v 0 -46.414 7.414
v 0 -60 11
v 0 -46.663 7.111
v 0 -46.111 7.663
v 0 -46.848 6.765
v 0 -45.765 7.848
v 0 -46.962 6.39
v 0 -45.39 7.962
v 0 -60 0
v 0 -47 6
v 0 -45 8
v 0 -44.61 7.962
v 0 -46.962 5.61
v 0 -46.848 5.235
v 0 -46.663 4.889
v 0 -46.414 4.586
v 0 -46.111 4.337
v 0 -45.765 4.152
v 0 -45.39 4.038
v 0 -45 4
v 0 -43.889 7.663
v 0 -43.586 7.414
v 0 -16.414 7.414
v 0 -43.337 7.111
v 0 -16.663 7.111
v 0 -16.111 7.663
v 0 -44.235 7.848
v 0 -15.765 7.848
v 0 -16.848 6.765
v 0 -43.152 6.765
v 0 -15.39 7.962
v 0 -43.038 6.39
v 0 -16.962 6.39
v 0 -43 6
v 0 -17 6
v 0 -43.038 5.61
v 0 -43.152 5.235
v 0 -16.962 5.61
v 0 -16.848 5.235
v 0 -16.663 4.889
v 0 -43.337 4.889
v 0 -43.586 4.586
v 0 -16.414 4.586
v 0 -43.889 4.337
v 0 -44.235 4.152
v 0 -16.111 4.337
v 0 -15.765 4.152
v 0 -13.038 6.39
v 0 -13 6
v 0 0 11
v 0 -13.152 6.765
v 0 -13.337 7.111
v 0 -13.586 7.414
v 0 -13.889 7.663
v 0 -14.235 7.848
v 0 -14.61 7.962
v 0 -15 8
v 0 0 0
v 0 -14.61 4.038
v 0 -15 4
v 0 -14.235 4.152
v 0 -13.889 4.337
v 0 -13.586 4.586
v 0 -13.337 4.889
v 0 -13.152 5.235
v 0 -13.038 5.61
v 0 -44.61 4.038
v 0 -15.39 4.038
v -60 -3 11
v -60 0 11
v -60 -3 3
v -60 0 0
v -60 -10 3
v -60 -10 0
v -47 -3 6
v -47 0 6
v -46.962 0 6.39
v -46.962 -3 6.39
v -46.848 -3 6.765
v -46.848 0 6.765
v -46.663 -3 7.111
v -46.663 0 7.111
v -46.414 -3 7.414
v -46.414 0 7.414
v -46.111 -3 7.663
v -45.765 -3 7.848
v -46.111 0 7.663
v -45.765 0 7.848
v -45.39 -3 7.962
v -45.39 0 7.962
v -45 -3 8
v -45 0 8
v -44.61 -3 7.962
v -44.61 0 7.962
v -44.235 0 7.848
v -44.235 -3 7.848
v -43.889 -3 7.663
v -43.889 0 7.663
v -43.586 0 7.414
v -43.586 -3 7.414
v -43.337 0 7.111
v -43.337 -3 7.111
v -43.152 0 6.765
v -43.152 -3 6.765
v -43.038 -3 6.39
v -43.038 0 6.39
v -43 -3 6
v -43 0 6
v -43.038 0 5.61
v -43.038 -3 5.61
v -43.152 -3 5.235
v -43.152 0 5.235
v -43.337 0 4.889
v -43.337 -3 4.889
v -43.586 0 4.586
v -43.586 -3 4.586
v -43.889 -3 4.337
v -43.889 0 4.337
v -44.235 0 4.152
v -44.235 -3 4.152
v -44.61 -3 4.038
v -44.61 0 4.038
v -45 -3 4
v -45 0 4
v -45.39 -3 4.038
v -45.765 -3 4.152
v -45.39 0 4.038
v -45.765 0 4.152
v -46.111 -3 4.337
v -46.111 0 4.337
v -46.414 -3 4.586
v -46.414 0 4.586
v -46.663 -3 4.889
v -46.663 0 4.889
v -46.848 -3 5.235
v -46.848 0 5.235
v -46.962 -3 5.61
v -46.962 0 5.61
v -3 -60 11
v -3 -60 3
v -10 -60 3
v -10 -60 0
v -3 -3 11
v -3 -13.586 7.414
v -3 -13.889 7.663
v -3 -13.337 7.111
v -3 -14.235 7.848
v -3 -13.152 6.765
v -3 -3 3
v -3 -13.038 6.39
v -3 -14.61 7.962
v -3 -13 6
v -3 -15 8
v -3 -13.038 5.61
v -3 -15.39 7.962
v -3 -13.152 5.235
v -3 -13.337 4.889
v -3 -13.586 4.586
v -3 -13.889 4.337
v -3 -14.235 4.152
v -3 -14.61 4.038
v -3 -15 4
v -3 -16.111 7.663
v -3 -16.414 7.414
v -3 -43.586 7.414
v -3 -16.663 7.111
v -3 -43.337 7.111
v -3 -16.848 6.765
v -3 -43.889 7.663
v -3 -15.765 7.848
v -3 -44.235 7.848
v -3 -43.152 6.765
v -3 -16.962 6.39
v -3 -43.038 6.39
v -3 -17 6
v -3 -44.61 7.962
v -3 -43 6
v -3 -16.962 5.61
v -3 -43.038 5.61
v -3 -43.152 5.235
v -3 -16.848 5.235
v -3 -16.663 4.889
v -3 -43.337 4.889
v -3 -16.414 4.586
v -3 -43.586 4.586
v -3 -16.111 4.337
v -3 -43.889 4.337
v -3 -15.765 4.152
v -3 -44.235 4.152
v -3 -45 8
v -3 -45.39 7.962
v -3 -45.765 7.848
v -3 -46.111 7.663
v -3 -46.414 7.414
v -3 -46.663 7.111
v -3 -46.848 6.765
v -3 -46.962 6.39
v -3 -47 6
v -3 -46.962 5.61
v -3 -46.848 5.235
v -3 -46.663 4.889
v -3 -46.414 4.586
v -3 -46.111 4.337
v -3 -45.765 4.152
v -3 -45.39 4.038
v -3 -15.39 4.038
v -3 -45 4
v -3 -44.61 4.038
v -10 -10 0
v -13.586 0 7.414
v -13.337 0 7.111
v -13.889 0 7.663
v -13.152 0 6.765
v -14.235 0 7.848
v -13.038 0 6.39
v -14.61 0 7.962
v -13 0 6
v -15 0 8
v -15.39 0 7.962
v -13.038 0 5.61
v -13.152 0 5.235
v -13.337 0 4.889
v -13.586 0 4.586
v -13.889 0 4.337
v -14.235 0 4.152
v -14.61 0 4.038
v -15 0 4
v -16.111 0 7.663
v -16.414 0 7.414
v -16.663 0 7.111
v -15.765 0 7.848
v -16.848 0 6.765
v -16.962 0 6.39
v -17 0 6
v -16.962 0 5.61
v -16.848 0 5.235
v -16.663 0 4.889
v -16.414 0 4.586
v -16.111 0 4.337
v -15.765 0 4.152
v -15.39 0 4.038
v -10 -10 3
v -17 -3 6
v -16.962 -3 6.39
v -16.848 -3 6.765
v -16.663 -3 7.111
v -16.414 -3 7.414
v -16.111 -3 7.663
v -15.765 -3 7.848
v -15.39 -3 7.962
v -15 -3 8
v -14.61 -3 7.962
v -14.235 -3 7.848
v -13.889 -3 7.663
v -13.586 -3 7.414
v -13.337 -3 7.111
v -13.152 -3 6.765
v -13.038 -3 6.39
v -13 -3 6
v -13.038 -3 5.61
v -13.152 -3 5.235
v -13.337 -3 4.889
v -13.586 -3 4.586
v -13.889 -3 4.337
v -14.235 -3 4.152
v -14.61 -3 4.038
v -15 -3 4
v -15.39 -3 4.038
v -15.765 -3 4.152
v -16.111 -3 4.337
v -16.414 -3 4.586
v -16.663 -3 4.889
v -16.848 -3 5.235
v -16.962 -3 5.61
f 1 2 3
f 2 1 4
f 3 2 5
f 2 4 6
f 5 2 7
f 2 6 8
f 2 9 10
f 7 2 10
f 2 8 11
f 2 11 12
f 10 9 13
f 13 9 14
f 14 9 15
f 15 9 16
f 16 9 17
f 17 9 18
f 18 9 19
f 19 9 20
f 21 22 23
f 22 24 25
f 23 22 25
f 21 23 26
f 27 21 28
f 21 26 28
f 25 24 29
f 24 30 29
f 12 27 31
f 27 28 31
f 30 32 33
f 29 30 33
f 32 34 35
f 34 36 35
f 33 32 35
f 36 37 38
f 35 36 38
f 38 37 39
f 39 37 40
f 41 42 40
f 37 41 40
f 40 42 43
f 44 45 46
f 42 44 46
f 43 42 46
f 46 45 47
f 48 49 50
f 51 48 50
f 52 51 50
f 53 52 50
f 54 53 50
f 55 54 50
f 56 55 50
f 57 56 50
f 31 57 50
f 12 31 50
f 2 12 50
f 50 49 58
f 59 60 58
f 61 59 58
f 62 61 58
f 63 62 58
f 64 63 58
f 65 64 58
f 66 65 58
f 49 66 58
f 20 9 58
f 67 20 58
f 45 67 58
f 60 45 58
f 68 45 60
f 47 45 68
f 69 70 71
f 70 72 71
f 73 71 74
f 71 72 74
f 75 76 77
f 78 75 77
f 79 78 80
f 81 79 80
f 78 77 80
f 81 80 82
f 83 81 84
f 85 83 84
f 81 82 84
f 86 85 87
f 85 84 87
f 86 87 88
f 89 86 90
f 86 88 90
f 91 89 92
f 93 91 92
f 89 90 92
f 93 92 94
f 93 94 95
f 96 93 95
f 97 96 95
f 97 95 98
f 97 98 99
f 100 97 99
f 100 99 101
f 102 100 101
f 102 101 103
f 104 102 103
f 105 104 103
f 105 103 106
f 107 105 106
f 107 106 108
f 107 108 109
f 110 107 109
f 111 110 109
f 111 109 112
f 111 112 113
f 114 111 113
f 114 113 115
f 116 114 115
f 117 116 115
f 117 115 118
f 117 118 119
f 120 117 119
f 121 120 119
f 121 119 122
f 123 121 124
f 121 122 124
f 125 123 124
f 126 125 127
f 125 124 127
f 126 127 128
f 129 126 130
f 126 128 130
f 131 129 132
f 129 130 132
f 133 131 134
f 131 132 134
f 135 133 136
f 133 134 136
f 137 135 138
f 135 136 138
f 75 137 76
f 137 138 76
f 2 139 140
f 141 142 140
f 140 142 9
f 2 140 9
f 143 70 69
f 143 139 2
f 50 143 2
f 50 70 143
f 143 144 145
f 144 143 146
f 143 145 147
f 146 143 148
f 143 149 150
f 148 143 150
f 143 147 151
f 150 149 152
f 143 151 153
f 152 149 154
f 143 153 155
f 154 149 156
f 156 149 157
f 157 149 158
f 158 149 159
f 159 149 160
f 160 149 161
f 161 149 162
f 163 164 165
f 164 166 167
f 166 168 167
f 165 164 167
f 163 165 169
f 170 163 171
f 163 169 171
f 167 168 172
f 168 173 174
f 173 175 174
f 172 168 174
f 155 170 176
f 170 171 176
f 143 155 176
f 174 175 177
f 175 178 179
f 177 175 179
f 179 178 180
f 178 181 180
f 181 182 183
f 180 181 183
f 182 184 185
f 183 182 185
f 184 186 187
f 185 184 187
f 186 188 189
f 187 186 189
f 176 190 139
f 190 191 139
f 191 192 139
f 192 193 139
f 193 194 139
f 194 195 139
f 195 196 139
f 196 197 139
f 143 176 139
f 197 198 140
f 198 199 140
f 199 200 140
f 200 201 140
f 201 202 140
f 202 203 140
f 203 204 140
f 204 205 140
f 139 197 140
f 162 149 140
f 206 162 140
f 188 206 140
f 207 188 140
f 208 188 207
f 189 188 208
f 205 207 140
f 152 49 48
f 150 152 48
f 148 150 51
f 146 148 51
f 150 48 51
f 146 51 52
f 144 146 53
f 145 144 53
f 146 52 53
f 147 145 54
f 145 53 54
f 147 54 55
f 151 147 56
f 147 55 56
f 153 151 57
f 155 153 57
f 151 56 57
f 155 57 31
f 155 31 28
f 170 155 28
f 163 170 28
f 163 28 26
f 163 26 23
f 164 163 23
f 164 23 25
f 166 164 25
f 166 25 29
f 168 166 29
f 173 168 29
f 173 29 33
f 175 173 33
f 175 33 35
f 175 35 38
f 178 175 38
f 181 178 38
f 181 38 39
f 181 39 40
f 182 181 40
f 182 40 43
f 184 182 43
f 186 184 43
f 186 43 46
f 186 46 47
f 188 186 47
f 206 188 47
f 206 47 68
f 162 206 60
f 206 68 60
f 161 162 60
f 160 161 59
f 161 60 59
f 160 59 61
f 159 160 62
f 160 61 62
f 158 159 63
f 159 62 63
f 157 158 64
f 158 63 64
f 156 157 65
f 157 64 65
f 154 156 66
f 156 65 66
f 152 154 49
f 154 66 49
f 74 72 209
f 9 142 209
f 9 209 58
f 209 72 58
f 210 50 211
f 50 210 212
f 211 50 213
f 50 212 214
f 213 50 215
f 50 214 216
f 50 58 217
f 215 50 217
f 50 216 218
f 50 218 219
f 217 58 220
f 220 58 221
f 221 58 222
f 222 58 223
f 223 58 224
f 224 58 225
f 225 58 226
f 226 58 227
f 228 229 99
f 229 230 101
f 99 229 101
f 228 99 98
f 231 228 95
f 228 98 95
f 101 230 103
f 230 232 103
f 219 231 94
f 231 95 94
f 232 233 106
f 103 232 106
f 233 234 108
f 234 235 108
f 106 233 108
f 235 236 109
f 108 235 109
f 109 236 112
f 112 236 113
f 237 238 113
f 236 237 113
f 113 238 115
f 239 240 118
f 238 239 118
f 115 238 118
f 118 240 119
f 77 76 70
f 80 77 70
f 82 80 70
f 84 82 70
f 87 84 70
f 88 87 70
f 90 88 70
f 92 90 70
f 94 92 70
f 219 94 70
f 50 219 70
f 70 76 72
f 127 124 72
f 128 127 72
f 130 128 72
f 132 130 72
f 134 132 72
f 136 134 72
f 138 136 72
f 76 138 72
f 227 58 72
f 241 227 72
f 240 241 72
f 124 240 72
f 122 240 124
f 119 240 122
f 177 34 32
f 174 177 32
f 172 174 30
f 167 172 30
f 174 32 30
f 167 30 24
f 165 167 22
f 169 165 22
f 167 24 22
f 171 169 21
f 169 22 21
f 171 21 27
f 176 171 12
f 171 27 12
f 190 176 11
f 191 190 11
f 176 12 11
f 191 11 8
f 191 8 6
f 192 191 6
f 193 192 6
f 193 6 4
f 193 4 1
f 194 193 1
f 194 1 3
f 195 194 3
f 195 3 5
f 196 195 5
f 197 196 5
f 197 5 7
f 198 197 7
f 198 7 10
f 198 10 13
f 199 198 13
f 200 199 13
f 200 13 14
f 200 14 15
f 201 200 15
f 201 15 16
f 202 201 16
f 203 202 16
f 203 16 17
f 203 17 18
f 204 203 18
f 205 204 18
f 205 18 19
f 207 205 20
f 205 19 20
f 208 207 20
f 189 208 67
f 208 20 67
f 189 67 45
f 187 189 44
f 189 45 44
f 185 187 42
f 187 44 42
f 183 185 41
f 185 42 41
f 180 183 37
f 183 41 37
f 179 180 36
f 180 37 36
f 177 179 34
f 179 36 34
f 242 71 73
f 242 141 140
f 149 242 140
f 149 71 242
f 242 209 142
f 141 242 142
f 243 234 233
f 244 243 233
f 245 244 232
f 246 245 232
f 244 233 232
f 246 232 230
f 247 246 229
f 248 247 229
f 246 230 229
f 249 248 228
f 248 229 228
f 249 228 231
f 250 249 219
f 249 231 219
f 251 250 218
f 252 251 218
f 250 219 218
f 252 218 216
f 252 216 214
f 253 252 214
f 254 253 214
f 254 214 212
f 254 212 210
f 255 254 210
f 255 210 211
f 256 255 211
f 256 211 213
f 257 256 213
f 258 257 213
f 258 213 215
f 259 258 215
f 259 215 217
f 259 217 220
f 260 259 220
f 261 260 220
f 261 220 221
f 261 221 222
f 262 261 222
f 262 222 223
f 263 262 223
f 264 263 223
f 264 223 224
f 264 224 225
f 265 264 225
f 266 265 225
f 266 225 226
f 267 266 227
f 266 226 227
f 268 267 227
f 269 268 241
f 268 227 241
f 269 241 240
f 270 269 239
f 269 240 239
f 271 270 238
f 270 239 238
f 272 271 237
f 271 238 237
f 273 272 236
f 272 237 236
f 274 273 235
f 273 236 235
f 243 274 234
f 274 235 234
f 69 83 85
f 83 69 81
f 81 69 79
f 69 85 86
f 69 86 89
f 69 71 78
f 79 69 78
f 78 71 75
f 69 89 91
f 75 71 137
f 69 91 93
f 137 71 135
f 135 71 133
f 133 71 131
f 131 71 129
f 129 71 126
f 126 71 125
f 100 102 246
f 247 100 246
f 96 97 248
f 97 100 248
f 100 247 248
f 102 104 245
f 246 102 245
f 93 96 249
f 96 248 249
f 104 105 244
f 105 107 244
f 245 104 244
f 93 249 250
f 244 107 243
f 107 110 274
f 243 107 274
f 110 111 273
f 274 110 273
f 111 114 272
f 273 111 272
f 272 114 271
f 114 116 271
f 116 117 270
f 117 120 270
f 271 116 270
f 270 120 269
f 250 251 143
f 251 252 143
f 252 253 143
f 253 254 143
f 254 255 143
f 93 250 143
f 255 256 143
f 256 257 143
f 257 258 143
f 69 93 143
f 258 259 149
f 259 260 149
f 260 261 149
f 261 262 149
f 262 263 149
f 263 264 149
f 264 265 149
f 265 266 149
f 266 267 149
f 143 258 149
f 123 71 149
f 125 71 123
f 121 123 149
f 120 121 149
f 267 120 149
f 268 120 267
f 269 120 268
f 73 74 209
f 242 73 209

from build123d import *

# Parameters (mm, degrees)
F1_DEPTH = 3
F3_DEPTH = 8
F4_R     = 2
F5_DEPTH = 4
F6_R     = 2
F7_DEPTH = 6


with BuildPart() as f1:
    # F0 (on Top) → F1 (new body)
    with BuildSketch(Plane.XY):
        Polygon((0, 0), (-60, 0), (-60, -10), (-10, -10), (-10, -60), (0, -60), align=None)
    extrude(amount=F1_DEPTH)

    # F2 (on face) → F3 (join)
    with BuildSketch(Plane.XY.offset(3)):
        Polygon((0, 0), (-60, 0), (-60, -3), (-3, -3), (-3, -60), (0, -60), align=None)
    extrude(amount=F3_DEPTH)

    # F4 (on face) → F5 (cut)
    with BuildSketch(Plane.YZ):
        with Locations((-15, 6)):
            Circle(F4_R)
        with Locations((-45, 6)):
            Circle(F4_R)
    extrude(amount=-F5_DEPTH, mode=Mode.SUBTRACT)

    # F6 (on face) → F7 (cut)
    with BuildSketch(Plane(origin=(0, 0, 0), x_dir=(-1, 0, 0), z_dir=(0, 1, 0))):
        with Locations((45, 6)):
            Circle(F6_R)
        with Locations((15, 6)):
            Circle(F6_R)
    extrude(amount=-F7_DEPTH, mode=Mode.SUBTRACT)


solid = f1.part
